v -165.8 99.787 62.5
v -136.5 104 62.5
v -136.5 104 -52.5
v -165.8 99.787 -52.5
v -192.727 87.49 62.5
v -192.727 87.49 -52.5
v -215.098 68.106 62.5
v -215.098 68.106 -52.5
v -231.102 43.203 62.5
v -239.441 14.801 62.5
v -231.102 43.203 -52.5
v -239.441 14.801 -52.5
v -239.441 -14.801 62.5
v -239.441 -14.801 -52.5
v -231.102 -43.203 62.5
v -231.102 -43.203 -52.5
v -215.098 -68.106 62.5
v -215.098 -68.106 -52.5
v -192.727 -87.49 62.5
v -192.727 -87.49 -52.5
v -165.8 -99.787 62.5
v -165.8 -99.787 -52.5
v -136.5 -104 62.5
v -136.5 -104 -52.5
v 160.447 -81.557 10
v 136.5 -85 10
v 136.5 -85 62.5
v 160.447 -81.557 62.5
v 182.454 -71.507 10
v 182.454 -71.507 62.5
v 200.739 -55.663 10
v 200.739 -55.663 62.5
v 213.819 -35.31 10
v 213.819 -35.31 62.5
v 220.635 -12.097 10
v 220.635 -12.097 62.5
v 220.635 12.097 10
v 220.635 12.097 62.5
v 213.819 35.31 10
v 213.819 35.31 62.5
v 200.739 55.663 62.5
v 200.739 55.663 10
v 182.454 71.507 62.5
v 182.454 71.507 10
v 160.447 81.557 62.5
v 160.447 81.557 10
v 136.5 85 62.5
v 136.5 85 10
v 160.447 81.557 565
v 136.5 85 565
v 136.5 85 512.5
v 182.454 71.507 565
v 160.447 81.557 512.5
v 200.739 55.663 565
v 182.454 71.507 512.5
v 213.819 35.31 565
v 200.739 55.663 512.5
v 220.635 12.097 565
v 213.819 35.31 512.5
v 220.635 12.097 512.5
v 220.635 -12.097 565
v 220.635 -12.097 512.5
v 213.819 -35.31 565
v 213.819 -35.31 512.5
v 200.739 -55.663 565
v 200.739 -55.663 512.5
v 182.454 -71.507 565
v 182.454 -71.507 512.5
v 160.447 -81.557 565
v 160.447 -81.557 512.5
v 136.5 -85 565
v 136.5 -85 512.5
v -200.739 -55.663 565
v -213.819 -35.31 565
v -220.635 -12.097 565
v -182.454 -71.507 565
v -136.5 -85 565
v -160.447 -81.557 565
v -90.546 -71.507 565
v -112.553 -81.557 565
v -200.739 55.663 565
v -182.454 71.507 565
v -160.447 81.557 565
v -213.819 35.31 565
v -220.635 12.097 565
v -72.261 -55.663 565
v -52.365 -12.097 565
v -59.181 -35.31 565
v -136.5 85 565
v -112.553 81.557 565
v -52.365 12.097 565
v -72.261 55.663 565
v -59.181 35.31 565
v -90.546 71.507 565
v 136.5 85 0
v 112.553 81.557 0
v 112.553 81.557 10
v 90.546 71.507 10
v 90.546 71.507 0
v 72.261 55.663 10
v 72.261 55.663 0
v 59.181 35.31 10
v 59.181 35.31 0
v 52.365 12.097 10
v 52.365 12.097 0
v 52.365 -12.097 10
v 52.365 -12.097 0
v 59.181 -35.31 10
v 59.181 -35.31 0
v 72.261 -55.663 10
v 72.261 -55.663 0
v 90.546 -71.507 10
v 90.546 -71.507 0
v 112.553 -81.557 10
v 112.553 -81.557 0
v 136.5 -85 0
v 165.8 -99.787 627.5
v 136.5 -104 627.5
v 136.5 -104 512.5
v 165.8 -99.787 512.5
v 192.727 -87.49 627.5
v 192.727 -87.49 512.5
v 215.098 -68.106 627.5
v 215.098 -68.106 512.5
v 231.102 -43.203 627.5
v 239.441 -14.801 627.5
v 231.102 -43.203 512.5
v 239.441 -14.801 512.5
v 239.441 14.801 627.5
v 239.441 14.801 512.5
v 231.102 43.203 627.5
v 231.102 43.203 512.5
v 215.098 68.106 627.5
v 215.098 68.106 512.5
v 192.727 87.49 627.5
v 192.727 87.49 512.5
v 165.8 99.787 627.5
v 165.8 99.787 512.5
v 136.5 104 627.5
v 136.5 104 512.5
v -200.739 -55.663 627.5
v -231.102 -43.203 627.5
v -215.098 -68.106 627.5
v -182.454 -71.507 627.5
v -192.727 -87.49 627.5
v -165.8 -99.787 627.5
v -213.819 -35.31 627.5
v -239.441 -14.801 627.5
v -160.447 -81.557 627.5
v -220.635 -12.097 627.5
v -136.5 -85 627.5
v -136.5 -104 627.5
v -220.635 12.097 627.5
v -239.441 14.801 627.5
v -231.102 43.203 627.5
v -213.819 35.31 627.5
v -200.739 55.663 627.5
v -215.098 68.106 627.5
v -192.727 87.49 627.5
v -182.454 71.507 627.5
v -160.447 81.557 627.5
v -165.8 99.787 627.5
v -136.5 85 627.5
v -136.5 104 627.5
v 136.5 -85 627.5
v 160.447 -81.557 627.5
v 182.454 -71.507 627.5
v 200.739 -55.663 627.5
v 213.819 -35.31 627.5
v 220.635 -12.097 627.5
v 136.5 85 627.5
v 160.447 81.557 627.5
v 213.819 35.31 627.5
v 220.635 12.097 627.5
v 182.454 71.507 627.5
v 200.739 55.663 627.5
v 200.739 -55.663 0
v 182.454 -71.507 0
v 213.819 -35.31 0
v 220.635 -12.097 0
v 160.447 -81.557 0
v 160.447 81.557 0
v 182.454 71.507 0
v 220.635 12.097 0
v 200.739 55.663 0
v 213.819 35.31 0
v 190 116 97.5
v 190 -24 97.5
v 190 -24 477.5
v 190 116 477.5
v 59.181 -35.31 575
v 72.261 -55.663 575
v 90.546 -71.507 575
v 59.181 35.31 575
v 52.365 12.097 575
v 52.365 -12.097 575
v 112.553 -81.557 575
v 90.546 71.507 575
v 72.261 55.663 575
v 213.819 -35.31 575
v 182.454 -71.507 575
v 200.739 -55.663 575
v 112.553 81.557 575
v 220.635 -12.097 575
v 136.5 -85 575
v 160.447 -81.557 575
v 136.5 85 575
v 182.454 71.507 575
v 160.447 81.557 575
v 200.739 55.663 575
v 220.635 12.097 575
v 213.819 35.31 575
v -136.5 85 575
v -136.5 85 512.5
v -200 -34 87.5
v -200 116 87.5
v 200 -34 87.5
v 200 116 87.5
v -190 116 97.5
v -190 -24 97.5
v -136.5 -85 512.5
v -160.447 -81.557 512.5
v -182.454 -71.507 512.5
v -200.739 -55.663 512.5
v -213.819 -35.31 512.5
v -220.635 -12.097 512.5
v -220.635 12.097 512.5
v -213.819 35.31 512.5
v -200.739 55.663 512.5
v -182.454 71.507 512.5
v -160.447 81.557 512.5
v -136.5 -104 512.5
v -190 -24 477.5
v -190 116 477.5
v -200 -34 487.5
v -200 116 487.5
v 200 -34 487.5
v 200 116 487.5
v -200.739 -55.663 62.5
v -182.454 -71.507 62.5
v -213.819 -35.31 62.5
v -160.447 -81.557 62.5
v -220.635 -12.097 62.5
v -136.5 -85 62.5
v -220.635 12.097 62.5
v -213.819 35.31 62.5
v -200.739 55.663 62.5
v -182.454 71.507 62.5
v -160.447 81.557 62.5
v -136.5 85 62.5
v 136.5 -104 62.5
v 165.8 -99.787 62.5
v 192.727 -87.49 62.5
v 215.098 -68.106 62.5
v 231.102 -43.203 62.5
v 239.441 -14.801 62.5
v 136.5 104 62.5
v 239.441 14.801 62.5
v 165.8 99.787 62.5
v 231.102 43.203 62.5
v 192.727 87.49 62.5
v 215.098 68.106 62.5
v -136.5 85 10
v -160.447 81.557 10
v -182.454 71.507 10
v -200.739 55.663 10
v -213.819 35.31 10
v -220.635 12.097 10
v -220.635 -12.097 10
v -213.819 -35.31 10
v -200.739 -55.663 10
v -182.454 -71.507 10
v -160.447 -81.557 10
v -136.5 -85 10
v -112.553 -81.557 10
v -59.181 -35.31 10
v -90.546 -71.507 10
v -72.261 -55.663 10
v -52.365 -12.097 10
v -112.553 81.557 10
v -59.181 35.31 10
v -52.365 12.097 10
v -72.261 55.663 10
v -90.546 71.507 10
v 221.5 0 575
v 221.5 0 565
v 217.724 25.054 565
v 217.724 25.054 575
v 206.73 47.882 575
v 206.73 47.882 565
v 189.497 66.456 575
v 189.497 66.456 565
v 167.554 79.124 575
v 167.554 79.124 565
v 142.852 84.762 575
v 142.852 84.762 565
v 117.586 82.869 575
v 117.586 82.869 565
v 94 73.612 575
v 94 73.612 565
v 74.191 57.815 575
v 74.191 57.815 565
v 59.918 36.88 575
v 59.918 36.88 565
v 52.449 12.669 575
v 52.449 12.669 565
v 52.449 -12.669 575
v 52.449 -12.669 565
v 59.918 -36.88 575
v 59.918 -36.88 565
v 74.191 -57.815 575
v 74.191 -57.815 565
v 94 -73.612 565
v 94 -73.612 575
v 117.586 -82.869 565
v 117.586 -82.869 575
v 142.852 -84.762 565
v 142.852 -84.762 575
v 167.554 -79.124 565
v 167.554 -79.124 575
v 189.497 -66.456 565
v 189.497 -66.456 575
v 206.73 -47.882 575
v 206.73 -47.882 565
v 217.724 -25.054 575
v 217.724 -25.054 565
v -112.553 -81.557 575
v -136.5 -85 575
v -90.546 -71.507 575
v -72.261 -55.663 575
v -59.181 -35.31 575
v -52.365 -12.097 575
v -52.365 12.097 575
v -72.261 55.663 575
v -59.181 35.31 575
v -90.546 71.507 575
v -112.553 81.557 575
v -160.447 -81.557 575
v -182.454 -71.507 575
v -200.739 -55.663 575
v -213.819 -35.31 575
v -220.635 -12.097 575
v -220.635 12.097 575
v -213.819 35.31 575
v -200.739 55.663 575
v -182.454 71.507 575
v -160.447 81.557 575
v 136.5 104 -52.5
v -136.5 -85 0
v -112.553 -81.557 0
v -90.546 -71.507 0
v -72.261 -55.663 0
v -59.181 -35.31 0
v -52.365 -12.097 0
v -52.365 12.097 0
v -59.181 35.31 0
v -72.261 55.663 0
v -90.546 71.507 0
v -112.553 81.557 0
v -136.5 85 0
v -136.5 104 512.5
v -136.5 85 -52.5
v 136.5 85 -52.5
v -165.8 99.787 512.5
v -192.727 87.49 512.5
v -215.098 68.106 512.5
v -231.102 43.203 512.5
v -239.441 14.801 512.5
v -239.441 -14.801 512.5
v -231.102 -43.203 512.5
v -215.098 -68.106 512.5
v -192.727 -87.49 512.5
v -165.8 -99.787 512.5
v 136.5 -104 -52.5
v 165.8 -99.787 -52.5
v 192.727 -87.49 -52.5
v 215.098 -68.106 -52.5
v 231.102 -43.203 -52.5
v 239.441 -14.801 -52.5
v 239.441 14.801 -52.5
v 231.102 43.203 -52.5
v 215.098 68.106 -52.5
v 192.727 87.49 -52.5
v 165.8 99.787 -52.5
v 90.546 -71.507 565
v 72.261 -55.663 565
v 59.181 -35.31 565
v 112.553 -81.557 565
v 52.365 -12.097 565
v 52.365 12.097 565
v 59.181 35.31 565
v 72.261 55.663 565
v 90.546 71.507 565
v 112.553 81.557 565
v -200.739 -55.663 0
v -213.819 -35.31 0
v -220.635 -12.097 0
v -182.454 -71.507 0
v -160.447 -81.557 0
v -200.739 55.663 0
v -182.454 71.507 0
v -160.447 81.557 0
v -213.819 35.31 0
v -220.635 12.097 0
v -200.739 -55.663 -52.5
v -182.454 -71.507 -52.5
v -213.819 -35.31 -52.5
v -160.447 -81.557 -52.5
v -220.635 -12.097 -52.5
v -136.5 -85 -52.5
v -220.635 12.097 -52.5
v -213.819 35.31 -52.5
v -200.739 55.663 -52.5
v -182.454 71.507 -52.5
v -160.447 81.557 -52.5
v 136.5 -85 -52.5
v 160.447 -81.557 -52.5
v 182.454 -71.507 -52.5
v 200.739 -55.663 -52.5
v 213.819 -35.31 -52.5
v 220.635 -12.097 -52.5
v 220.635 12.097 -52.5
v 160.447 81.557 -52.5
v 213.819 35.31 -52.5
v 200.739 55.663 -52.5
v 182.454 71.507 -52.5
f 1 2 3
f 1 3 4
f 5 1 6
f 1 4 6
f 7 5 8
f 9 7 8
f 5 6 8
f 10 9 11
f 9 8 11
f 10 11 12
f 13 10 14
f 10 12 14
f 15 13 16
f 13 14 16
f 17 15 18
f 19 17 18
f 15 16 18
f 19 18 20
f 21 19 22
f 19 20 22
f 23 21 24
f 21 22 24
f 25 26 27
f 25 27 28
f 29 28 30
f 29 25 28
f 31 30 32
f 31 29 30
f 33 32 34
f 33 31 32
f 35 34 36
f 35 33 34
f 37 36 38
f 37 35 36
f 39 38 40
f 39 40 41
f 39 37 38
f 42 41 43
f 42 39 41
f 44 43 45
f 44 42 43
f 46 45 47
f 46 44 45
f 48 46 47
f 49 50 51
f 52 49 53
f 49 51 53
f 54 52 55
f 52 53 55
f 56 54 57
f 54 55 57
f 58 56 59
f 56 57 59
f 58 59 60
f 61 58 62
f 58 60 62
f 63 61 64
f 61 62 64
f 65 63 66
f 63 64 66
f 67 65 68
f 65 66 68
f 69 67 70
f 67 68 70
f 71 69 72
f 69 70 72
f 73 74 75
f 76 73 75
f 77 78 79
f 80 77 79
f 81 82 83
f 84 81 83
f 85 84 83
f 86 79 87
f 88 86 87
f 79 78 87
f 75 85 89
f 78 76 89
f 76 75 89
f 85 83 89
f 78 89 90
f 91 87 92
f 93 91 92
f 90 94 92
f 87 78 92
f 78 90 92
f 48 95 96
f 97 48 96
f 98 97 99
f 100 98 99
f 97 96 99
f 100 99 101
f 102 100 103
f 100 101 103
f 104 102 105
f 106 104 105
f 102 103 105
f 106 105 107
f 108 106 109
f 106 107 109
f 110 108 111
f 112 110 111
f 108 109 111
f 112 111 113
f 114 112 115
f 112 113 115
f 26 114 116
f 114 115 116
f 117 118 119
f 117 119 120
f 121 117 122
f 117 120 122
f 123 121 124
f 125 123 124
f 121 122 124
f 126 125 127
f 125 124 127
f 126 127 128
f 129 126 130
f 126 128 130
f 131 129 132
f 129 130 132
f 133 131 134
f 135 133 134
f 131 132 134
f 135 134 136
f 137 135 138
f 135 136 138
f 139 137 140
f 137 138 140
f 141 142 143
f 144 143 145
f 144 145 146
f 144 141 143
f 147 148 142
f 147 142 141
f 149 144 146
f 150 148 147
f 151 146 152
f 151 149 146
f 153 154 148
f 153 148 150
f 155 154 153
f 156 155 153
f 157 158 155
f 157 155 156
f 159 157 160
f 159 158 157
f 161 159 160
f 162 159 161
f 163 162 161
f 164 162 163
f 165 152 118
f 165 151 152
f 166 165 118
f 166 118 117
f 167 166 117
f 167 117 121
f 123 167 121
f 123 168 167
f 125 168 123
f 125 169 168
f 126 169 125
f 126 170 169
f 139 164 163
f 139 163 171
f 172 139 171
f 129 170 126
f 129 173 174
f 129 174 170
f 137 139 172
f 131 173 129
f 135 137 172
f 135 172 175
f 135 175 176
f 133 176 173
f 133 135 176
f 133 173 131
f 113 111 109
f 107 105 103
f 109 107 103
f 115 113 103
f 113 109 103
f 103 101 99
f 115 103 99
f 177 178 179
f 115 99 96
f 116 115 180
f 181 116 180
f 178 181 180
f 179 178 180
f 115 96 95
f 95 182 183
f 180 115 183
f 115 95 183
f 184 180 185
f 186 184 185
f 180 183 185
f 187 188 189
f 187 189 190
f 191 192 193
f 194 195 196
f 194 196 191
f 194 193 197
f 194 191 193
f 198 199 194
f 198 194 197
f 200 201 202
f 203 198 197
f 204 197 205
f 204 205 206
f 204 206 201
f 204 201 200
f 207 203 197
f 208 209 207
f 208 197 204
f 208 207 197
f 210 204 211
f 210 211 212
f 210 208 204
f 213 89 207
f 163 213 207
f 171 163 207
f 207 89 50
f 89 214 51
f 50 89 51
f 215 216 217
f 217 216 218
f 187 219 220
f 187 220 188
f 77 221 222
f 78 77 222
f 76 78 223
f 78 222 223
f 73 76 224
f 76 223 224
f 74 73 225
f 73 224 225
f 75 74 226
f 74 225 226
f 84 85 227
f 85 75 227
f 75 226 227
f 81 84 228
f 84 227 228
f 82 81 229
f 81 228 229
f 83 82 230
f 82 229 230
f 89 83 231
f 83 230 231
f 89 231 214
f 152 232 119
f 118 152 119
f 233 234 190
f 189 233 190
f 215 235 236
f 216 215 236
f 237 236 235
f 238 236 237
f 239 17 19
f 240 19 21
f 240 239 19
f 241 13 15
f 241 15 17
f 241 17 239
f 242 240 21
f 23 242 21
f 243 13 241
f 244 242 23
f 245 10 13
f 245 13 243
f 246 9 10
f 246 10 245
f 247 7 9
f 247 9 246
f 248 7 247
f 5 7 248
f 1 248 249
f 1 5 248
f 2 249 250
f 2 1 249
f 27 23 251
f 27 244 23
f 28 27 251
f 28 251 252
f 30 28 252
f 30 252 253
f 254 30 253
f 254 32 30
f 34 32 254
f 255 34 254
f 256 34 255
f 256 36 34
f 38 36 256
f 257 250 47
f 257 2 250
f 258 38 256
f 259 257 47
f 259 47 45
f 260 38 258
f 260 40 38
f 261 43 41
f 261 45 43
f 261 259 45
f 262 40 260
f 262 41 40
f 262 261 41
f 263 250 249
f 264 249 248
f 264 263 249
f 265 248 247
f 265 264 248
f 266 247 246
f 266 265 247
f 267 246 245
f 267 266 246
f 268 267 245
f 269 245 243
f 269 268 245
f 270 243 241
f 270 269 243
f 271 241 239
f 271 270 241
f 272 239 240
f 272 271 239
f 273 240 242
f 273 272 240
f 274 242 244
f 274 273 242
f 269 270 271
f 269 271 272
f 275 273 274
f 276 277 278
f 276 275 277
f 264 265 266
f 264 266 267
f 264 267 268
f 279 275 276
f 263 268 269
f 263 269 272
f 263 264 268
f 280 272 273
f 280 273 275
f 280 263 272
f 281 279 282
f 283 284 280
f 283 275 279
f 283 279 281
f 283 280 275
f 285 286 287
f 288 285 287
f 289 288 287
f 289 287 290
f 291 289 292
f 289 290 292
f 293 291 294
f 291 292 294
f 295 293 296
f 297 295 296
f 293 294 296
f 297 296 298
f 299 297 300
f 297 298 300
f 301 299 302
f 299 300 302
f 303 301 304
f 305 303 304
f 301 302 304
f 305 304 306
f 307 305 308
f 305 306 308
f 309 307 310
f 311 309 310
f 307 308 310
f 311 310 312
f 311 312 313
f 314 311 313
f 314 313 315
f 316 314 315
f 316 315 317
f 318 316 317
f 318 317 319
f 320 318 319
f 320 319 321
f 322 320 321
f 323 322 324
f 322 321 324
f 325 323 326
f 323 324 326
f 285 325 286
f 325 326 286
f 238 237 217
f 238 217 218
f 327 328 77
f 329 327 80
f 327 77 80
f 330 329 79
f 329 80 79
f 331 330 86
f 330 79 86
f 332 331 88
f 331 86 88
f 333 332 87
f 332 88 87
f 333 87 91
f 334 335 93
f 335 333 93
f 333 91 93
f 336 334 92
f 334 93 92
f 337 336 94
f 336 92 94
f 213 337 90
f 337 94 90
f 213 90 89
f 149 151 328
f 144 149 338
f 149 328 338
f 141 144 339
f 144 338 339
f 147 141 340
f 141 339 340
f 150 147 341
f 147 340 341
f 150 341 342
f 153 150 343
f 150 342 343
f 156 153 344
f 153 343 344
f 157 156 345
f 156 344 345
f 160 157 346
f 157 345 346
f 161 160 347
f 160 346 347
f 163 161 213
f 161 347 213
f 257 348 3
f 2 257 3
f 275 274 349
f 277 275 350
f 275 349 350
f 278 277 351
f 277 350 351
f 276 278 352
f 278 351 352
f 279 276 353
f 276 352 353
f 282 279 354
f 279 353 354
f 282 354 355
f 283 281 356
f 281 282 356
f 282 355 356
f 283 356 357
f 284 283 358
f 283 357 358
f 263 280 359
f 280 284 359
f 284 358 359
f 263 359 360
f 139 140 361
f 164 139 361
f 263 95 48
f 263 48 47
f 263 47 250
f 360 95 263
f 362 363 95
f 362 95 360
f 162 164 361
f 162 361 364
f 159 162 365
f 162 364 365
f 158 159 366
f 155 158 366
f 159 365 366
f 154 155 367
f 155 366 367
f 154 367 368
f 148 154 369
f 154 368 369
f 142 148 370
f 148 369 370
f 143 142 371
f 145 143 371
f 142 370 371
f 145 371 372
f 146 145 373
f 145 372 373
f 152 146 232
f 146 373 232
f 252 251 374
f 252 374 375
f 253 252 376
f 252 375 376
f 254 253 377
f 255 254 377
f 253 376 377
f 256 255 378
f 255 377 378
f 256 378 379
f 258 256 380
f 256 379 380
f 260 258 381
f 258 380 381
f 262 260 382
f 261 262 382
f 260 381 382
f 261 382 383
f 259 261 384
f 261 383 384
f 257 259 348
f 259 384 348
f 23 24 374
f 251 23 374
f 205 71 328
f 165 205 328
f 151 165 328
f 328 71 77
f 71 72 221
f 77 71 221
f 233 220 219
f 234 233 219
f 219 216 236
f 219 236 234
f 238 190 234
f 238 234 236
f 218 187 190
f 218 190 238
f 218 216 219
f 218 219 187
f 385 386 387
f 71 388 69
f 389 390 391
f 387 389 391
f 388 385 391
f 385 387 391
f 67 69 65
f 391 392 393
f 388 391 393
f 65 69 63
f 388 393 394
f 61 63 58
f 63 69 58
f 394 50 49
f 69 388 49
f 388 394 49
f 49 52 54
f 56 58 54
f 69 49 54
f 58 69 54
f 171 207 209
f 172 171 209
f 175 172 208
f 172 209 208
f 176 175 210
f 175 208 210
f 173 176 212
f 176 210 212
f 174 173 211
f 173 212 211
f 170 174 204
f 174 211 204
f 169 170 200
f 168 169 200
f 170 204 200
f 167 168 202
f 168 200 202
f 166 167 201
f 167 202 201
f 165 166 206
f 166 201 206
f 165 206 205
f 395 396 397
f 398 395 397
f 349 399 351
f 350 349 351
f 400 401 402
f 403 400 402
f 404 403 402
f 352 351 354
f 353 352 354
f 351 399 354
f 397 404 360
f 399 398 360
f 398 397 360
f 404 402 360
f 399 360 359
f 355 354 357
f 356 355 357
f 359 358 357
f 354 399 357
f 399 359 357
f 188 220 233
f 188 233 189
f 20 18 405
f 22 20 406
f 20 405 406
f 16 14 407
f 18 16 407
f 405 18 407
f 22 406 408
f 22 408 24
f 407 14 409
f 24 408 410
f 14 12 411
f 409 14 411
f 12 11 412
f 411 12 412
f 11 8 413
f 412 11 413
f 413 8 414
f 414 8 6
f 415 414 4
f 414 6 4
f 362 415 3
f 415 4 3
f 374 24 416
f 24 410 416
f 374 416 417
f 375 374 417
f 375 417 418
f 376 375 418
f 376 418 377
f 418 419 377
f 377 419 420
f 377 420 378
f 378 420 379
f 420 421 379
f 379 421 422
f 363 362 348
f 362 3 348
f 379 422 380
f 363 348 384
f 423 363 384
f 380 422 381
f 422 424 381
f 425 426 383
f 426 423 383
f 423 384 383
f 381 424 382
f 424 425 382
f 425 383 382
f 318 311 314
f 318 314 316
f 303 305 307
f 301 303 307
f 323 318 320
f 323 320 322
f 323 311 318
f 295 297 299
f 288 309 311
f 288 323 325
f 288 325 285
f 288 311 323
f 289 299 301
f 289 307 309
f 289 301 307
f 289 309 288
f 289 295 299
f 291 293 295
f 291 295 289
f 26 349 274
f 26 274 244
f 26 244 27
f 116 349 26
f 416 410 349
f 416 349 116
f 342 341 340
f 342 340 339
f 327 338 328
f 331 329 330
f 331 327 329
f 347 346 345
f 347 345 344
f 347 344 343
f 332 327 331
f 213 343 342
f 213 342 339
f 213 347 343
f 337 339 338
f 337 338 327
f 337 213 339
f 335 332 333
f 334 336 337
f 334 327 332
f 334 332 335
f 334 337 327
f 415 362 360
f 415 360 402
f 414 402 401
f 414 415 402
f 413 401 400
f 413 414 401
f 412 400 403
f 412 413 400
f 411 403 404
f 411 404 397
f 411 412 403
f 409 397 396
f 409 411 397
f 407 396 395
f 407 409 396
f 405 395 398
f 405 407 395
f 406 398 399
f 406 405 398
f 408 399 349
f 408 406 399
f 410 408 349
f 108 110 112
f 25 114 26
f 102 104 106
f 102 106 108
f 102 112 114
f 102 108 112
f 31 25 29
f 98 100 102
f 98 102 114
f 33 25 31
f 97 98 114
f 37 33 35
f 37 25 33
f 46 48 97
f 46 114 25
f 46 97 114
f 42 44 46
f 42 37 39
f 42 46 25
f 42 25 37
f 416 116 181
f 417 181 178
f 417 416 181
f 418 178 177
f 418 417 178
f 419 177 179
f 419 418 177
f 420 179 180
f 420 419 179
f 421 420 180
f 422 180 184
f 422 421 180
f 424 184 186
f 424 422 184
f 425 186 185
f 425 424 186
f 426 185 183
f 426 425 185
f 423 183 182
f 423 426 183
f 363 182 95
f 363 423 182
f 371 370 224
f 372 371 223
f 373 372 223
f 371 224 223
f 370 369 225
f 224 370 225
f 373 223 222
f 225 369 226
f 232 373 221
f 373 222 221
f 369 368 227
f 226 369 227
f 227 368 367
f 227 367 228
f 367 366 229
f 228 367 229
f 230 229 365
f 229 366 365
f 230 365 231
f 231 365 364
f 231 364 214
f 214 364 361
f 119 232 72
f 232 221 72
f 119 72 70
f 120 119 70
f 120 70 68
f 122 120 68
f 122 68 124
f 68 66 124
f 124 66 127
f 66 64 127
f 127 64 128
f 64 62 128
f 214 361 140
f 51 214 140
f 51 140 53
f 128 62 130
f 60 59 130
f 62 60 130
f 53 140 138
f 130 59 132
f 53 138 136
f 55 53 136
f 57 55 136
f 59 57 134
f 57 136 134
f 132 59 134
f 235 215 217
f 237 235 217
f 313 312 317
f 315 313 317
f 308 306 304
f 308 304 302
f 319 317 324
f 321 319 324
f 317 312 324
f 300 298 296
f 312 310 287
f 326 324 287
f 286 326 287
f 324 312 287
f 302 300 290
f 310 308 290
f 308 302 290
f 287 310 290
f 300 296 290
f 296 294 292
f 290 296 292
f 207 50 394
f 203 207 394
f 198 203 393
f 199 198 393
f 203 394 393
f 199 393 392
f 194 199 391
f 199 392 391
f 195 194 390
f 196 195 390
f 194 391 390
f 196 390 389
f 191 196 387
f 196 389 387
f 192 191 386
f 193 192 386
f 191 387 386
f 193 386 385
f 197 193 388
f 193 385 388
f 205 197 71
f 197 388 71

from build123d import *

# Parameters (mm, degrees)
SCHIZZO1_R                     = 85
ESTRUSIONE_ESTRUSIONE1_DEPTH   = 10
ESTRUSIONE_ESTRUSIONE1_2_DEPTH = 10
ESTRUSIONE_SOTTILE1_START      = -62.5
ESTRUSIONE_SOTTILE1_DEPTH      = 115
SCHIZZO3_W                     = 400
SCHIZZO3_H                     = 150
ESTRUSIONE_ESTRUSIONE2_DEPTH   = 400
SVUOTA1_T                      = -10
RIPETIZIONE_START              = 565
RIPETIZIONE_A_L2_OUTLINE_R     = 85
RIPETIZIONE_A_L2_DEPTH         = 10
RIPETIZIONE_START_2            = 512.5
RIPETIZIONE_A_L2_2_DEPTH       = 115
RIPETIZIONE_A_L2_3_OUTLINE_R   = 85
RIPETIZIONE_A_L2_3_DEPTH       = 10


# Read off the part's stored shape, not the designer's step: Ripetizione a L2
with BuildPart() as part:
    # Schizzo1 → Estrusione-Estrusione1 (new body)
    with BuildSketch(Plane.XY):
        with Locations((-136.5, 0)):
            Circle(SCHIZZO1_R)
    extrude(amount=ESTRUSIONE_ESTRUSIONE1_DEPTH)



with BuildPart() as body_2:
    # Schizzo1 → Estrusione-Estrusione1 2 (new body)
    with BuildSketch(Plane.XY):
        with Locations((136.5, 0)):
            Circle(SCHIZZO1_R)
    extrude(amount=ESTRUSIONE_ESTRUSIONE1_2_DEPTH)


with BuildPart() as part_1:
    add(part.part)

    add(body_2.part)  # Estrusione-Sottile1 merges body 2
    # Schizzo2 → Estrusione-Sottile1 (add)
    with BuildSketch(Plane.XY.offset(10).offset(ESTRUSIONE_SOTTILE1_START)):
        with BuildLine():
            Line((136.5, 104), (-136.5, 104))
            ThreePointArc((-136.5, 104), (-240.5, 0), (-136.5, -104))
            Line((-136.5, -104), (136.5, -104))
            ThreePointArc((136.5, -104), (240.5, 0), (136.5, 104))
        make_face()
        with BuildLine():
            Line((136.5, 85), (-136.5, 85))
            ThreePointArc((-136.5, 85), (-221.5, 0), (-136.5, -85))
            Line((-136.5, -85), (136.5, -85))
            ThreePointArc((136.5, -85), (221.5, 0), (136.5, 85))
        make_face(mode=Mode.SUBTRACT)
    extrude(amount=ESTRUSIONE_SOTTILE1_DEPTH)


with BuildPart() as body_2_2:
    # Schizzo3 → Estrusione-Estrusione2 (new body)
    with BuildSketch(Plane.XY.offset(87.5)):
        with Locations((0, 41)):
            Rectangle(SCHIZZO3_W, SCHIZZO3_H)
    extrude(amount=ESTRUSIONE_ESTRUSIONE2_DEPTH)

    # Svuota1
    svuota1_openings = [body_2_2.faces().sort_by_distance(p)[0] for p in [
        (0, 116, 287.5),
    ]]
    offset(amount=SVUOTA1_T, openings=svuota1_openings, kind=Kind.INTERSECTION)


with BuildPart() as body_3:
    # Ripetizione a L2 outline → Ripetizione a L2 (new body)
    with BuildSketch(Plane.XY.offset(RIPETIZIONE_START)):
        with Locations((136.5, 0)):
            Circle(RIPETIZIONE_A_L2_OUTLINE_R)
    extrude(amount=RIPETIZIONE_A_L2_DEPTH)


with BuildPart() as body_4:
    # Ripetizione a L2 2 outline → Ripetizione a L2 2 (new body)
    with BuildSketch(Plane.XY.offset(RIPETIZIONE_START_2)):
        with BuildLine():
            ThreePointArc((-136.5, 104), (-240.5, 0), (-136.5, -104))
            Line((-136.5, -104), (136.5, -104))
            ThreePointArc((136.5, -104), (240.5, 0), (136.5, 104))
            Line((136.5, 104), (-136.5, 104))
        make_face()
        with BuildLine():
            Line((-136.5, 85), (136.5, 85))
            ThreePointArc((136.5, 85), (221.5, 0), (136.5, -85))
            Line((136.5, -85), (-136.5, -85))
            ThreePointArc((-136.5, -85), (-221.5, 0), (-136.5, 85))
        make_face(mode=Mode.SUBTRACT)
    extrude(amount=RIPETIZIONE_A_L2_2_DEPTH)

    # Ripetizione a L2 3 outline → Ripetizione a L2 3 (add)
    with BuildSketch(Plane.XY.offset(RIPETIZIONE_START)):
        with Locations((136.5, 0)):
            Circle(RIPETIZIONE_A_L2_3_OUTLINE_R)
        with Locations((-136.5, 0)):
            Circle(RIPETIZIONE_A_L2_3_OUTLINE_R)
    extrude(amount=RIPETIZIONE_A_L2_3_DEPTH)


solid = Compound([part_1.part, body_2_2.part, body_3.part, body_4.part])
